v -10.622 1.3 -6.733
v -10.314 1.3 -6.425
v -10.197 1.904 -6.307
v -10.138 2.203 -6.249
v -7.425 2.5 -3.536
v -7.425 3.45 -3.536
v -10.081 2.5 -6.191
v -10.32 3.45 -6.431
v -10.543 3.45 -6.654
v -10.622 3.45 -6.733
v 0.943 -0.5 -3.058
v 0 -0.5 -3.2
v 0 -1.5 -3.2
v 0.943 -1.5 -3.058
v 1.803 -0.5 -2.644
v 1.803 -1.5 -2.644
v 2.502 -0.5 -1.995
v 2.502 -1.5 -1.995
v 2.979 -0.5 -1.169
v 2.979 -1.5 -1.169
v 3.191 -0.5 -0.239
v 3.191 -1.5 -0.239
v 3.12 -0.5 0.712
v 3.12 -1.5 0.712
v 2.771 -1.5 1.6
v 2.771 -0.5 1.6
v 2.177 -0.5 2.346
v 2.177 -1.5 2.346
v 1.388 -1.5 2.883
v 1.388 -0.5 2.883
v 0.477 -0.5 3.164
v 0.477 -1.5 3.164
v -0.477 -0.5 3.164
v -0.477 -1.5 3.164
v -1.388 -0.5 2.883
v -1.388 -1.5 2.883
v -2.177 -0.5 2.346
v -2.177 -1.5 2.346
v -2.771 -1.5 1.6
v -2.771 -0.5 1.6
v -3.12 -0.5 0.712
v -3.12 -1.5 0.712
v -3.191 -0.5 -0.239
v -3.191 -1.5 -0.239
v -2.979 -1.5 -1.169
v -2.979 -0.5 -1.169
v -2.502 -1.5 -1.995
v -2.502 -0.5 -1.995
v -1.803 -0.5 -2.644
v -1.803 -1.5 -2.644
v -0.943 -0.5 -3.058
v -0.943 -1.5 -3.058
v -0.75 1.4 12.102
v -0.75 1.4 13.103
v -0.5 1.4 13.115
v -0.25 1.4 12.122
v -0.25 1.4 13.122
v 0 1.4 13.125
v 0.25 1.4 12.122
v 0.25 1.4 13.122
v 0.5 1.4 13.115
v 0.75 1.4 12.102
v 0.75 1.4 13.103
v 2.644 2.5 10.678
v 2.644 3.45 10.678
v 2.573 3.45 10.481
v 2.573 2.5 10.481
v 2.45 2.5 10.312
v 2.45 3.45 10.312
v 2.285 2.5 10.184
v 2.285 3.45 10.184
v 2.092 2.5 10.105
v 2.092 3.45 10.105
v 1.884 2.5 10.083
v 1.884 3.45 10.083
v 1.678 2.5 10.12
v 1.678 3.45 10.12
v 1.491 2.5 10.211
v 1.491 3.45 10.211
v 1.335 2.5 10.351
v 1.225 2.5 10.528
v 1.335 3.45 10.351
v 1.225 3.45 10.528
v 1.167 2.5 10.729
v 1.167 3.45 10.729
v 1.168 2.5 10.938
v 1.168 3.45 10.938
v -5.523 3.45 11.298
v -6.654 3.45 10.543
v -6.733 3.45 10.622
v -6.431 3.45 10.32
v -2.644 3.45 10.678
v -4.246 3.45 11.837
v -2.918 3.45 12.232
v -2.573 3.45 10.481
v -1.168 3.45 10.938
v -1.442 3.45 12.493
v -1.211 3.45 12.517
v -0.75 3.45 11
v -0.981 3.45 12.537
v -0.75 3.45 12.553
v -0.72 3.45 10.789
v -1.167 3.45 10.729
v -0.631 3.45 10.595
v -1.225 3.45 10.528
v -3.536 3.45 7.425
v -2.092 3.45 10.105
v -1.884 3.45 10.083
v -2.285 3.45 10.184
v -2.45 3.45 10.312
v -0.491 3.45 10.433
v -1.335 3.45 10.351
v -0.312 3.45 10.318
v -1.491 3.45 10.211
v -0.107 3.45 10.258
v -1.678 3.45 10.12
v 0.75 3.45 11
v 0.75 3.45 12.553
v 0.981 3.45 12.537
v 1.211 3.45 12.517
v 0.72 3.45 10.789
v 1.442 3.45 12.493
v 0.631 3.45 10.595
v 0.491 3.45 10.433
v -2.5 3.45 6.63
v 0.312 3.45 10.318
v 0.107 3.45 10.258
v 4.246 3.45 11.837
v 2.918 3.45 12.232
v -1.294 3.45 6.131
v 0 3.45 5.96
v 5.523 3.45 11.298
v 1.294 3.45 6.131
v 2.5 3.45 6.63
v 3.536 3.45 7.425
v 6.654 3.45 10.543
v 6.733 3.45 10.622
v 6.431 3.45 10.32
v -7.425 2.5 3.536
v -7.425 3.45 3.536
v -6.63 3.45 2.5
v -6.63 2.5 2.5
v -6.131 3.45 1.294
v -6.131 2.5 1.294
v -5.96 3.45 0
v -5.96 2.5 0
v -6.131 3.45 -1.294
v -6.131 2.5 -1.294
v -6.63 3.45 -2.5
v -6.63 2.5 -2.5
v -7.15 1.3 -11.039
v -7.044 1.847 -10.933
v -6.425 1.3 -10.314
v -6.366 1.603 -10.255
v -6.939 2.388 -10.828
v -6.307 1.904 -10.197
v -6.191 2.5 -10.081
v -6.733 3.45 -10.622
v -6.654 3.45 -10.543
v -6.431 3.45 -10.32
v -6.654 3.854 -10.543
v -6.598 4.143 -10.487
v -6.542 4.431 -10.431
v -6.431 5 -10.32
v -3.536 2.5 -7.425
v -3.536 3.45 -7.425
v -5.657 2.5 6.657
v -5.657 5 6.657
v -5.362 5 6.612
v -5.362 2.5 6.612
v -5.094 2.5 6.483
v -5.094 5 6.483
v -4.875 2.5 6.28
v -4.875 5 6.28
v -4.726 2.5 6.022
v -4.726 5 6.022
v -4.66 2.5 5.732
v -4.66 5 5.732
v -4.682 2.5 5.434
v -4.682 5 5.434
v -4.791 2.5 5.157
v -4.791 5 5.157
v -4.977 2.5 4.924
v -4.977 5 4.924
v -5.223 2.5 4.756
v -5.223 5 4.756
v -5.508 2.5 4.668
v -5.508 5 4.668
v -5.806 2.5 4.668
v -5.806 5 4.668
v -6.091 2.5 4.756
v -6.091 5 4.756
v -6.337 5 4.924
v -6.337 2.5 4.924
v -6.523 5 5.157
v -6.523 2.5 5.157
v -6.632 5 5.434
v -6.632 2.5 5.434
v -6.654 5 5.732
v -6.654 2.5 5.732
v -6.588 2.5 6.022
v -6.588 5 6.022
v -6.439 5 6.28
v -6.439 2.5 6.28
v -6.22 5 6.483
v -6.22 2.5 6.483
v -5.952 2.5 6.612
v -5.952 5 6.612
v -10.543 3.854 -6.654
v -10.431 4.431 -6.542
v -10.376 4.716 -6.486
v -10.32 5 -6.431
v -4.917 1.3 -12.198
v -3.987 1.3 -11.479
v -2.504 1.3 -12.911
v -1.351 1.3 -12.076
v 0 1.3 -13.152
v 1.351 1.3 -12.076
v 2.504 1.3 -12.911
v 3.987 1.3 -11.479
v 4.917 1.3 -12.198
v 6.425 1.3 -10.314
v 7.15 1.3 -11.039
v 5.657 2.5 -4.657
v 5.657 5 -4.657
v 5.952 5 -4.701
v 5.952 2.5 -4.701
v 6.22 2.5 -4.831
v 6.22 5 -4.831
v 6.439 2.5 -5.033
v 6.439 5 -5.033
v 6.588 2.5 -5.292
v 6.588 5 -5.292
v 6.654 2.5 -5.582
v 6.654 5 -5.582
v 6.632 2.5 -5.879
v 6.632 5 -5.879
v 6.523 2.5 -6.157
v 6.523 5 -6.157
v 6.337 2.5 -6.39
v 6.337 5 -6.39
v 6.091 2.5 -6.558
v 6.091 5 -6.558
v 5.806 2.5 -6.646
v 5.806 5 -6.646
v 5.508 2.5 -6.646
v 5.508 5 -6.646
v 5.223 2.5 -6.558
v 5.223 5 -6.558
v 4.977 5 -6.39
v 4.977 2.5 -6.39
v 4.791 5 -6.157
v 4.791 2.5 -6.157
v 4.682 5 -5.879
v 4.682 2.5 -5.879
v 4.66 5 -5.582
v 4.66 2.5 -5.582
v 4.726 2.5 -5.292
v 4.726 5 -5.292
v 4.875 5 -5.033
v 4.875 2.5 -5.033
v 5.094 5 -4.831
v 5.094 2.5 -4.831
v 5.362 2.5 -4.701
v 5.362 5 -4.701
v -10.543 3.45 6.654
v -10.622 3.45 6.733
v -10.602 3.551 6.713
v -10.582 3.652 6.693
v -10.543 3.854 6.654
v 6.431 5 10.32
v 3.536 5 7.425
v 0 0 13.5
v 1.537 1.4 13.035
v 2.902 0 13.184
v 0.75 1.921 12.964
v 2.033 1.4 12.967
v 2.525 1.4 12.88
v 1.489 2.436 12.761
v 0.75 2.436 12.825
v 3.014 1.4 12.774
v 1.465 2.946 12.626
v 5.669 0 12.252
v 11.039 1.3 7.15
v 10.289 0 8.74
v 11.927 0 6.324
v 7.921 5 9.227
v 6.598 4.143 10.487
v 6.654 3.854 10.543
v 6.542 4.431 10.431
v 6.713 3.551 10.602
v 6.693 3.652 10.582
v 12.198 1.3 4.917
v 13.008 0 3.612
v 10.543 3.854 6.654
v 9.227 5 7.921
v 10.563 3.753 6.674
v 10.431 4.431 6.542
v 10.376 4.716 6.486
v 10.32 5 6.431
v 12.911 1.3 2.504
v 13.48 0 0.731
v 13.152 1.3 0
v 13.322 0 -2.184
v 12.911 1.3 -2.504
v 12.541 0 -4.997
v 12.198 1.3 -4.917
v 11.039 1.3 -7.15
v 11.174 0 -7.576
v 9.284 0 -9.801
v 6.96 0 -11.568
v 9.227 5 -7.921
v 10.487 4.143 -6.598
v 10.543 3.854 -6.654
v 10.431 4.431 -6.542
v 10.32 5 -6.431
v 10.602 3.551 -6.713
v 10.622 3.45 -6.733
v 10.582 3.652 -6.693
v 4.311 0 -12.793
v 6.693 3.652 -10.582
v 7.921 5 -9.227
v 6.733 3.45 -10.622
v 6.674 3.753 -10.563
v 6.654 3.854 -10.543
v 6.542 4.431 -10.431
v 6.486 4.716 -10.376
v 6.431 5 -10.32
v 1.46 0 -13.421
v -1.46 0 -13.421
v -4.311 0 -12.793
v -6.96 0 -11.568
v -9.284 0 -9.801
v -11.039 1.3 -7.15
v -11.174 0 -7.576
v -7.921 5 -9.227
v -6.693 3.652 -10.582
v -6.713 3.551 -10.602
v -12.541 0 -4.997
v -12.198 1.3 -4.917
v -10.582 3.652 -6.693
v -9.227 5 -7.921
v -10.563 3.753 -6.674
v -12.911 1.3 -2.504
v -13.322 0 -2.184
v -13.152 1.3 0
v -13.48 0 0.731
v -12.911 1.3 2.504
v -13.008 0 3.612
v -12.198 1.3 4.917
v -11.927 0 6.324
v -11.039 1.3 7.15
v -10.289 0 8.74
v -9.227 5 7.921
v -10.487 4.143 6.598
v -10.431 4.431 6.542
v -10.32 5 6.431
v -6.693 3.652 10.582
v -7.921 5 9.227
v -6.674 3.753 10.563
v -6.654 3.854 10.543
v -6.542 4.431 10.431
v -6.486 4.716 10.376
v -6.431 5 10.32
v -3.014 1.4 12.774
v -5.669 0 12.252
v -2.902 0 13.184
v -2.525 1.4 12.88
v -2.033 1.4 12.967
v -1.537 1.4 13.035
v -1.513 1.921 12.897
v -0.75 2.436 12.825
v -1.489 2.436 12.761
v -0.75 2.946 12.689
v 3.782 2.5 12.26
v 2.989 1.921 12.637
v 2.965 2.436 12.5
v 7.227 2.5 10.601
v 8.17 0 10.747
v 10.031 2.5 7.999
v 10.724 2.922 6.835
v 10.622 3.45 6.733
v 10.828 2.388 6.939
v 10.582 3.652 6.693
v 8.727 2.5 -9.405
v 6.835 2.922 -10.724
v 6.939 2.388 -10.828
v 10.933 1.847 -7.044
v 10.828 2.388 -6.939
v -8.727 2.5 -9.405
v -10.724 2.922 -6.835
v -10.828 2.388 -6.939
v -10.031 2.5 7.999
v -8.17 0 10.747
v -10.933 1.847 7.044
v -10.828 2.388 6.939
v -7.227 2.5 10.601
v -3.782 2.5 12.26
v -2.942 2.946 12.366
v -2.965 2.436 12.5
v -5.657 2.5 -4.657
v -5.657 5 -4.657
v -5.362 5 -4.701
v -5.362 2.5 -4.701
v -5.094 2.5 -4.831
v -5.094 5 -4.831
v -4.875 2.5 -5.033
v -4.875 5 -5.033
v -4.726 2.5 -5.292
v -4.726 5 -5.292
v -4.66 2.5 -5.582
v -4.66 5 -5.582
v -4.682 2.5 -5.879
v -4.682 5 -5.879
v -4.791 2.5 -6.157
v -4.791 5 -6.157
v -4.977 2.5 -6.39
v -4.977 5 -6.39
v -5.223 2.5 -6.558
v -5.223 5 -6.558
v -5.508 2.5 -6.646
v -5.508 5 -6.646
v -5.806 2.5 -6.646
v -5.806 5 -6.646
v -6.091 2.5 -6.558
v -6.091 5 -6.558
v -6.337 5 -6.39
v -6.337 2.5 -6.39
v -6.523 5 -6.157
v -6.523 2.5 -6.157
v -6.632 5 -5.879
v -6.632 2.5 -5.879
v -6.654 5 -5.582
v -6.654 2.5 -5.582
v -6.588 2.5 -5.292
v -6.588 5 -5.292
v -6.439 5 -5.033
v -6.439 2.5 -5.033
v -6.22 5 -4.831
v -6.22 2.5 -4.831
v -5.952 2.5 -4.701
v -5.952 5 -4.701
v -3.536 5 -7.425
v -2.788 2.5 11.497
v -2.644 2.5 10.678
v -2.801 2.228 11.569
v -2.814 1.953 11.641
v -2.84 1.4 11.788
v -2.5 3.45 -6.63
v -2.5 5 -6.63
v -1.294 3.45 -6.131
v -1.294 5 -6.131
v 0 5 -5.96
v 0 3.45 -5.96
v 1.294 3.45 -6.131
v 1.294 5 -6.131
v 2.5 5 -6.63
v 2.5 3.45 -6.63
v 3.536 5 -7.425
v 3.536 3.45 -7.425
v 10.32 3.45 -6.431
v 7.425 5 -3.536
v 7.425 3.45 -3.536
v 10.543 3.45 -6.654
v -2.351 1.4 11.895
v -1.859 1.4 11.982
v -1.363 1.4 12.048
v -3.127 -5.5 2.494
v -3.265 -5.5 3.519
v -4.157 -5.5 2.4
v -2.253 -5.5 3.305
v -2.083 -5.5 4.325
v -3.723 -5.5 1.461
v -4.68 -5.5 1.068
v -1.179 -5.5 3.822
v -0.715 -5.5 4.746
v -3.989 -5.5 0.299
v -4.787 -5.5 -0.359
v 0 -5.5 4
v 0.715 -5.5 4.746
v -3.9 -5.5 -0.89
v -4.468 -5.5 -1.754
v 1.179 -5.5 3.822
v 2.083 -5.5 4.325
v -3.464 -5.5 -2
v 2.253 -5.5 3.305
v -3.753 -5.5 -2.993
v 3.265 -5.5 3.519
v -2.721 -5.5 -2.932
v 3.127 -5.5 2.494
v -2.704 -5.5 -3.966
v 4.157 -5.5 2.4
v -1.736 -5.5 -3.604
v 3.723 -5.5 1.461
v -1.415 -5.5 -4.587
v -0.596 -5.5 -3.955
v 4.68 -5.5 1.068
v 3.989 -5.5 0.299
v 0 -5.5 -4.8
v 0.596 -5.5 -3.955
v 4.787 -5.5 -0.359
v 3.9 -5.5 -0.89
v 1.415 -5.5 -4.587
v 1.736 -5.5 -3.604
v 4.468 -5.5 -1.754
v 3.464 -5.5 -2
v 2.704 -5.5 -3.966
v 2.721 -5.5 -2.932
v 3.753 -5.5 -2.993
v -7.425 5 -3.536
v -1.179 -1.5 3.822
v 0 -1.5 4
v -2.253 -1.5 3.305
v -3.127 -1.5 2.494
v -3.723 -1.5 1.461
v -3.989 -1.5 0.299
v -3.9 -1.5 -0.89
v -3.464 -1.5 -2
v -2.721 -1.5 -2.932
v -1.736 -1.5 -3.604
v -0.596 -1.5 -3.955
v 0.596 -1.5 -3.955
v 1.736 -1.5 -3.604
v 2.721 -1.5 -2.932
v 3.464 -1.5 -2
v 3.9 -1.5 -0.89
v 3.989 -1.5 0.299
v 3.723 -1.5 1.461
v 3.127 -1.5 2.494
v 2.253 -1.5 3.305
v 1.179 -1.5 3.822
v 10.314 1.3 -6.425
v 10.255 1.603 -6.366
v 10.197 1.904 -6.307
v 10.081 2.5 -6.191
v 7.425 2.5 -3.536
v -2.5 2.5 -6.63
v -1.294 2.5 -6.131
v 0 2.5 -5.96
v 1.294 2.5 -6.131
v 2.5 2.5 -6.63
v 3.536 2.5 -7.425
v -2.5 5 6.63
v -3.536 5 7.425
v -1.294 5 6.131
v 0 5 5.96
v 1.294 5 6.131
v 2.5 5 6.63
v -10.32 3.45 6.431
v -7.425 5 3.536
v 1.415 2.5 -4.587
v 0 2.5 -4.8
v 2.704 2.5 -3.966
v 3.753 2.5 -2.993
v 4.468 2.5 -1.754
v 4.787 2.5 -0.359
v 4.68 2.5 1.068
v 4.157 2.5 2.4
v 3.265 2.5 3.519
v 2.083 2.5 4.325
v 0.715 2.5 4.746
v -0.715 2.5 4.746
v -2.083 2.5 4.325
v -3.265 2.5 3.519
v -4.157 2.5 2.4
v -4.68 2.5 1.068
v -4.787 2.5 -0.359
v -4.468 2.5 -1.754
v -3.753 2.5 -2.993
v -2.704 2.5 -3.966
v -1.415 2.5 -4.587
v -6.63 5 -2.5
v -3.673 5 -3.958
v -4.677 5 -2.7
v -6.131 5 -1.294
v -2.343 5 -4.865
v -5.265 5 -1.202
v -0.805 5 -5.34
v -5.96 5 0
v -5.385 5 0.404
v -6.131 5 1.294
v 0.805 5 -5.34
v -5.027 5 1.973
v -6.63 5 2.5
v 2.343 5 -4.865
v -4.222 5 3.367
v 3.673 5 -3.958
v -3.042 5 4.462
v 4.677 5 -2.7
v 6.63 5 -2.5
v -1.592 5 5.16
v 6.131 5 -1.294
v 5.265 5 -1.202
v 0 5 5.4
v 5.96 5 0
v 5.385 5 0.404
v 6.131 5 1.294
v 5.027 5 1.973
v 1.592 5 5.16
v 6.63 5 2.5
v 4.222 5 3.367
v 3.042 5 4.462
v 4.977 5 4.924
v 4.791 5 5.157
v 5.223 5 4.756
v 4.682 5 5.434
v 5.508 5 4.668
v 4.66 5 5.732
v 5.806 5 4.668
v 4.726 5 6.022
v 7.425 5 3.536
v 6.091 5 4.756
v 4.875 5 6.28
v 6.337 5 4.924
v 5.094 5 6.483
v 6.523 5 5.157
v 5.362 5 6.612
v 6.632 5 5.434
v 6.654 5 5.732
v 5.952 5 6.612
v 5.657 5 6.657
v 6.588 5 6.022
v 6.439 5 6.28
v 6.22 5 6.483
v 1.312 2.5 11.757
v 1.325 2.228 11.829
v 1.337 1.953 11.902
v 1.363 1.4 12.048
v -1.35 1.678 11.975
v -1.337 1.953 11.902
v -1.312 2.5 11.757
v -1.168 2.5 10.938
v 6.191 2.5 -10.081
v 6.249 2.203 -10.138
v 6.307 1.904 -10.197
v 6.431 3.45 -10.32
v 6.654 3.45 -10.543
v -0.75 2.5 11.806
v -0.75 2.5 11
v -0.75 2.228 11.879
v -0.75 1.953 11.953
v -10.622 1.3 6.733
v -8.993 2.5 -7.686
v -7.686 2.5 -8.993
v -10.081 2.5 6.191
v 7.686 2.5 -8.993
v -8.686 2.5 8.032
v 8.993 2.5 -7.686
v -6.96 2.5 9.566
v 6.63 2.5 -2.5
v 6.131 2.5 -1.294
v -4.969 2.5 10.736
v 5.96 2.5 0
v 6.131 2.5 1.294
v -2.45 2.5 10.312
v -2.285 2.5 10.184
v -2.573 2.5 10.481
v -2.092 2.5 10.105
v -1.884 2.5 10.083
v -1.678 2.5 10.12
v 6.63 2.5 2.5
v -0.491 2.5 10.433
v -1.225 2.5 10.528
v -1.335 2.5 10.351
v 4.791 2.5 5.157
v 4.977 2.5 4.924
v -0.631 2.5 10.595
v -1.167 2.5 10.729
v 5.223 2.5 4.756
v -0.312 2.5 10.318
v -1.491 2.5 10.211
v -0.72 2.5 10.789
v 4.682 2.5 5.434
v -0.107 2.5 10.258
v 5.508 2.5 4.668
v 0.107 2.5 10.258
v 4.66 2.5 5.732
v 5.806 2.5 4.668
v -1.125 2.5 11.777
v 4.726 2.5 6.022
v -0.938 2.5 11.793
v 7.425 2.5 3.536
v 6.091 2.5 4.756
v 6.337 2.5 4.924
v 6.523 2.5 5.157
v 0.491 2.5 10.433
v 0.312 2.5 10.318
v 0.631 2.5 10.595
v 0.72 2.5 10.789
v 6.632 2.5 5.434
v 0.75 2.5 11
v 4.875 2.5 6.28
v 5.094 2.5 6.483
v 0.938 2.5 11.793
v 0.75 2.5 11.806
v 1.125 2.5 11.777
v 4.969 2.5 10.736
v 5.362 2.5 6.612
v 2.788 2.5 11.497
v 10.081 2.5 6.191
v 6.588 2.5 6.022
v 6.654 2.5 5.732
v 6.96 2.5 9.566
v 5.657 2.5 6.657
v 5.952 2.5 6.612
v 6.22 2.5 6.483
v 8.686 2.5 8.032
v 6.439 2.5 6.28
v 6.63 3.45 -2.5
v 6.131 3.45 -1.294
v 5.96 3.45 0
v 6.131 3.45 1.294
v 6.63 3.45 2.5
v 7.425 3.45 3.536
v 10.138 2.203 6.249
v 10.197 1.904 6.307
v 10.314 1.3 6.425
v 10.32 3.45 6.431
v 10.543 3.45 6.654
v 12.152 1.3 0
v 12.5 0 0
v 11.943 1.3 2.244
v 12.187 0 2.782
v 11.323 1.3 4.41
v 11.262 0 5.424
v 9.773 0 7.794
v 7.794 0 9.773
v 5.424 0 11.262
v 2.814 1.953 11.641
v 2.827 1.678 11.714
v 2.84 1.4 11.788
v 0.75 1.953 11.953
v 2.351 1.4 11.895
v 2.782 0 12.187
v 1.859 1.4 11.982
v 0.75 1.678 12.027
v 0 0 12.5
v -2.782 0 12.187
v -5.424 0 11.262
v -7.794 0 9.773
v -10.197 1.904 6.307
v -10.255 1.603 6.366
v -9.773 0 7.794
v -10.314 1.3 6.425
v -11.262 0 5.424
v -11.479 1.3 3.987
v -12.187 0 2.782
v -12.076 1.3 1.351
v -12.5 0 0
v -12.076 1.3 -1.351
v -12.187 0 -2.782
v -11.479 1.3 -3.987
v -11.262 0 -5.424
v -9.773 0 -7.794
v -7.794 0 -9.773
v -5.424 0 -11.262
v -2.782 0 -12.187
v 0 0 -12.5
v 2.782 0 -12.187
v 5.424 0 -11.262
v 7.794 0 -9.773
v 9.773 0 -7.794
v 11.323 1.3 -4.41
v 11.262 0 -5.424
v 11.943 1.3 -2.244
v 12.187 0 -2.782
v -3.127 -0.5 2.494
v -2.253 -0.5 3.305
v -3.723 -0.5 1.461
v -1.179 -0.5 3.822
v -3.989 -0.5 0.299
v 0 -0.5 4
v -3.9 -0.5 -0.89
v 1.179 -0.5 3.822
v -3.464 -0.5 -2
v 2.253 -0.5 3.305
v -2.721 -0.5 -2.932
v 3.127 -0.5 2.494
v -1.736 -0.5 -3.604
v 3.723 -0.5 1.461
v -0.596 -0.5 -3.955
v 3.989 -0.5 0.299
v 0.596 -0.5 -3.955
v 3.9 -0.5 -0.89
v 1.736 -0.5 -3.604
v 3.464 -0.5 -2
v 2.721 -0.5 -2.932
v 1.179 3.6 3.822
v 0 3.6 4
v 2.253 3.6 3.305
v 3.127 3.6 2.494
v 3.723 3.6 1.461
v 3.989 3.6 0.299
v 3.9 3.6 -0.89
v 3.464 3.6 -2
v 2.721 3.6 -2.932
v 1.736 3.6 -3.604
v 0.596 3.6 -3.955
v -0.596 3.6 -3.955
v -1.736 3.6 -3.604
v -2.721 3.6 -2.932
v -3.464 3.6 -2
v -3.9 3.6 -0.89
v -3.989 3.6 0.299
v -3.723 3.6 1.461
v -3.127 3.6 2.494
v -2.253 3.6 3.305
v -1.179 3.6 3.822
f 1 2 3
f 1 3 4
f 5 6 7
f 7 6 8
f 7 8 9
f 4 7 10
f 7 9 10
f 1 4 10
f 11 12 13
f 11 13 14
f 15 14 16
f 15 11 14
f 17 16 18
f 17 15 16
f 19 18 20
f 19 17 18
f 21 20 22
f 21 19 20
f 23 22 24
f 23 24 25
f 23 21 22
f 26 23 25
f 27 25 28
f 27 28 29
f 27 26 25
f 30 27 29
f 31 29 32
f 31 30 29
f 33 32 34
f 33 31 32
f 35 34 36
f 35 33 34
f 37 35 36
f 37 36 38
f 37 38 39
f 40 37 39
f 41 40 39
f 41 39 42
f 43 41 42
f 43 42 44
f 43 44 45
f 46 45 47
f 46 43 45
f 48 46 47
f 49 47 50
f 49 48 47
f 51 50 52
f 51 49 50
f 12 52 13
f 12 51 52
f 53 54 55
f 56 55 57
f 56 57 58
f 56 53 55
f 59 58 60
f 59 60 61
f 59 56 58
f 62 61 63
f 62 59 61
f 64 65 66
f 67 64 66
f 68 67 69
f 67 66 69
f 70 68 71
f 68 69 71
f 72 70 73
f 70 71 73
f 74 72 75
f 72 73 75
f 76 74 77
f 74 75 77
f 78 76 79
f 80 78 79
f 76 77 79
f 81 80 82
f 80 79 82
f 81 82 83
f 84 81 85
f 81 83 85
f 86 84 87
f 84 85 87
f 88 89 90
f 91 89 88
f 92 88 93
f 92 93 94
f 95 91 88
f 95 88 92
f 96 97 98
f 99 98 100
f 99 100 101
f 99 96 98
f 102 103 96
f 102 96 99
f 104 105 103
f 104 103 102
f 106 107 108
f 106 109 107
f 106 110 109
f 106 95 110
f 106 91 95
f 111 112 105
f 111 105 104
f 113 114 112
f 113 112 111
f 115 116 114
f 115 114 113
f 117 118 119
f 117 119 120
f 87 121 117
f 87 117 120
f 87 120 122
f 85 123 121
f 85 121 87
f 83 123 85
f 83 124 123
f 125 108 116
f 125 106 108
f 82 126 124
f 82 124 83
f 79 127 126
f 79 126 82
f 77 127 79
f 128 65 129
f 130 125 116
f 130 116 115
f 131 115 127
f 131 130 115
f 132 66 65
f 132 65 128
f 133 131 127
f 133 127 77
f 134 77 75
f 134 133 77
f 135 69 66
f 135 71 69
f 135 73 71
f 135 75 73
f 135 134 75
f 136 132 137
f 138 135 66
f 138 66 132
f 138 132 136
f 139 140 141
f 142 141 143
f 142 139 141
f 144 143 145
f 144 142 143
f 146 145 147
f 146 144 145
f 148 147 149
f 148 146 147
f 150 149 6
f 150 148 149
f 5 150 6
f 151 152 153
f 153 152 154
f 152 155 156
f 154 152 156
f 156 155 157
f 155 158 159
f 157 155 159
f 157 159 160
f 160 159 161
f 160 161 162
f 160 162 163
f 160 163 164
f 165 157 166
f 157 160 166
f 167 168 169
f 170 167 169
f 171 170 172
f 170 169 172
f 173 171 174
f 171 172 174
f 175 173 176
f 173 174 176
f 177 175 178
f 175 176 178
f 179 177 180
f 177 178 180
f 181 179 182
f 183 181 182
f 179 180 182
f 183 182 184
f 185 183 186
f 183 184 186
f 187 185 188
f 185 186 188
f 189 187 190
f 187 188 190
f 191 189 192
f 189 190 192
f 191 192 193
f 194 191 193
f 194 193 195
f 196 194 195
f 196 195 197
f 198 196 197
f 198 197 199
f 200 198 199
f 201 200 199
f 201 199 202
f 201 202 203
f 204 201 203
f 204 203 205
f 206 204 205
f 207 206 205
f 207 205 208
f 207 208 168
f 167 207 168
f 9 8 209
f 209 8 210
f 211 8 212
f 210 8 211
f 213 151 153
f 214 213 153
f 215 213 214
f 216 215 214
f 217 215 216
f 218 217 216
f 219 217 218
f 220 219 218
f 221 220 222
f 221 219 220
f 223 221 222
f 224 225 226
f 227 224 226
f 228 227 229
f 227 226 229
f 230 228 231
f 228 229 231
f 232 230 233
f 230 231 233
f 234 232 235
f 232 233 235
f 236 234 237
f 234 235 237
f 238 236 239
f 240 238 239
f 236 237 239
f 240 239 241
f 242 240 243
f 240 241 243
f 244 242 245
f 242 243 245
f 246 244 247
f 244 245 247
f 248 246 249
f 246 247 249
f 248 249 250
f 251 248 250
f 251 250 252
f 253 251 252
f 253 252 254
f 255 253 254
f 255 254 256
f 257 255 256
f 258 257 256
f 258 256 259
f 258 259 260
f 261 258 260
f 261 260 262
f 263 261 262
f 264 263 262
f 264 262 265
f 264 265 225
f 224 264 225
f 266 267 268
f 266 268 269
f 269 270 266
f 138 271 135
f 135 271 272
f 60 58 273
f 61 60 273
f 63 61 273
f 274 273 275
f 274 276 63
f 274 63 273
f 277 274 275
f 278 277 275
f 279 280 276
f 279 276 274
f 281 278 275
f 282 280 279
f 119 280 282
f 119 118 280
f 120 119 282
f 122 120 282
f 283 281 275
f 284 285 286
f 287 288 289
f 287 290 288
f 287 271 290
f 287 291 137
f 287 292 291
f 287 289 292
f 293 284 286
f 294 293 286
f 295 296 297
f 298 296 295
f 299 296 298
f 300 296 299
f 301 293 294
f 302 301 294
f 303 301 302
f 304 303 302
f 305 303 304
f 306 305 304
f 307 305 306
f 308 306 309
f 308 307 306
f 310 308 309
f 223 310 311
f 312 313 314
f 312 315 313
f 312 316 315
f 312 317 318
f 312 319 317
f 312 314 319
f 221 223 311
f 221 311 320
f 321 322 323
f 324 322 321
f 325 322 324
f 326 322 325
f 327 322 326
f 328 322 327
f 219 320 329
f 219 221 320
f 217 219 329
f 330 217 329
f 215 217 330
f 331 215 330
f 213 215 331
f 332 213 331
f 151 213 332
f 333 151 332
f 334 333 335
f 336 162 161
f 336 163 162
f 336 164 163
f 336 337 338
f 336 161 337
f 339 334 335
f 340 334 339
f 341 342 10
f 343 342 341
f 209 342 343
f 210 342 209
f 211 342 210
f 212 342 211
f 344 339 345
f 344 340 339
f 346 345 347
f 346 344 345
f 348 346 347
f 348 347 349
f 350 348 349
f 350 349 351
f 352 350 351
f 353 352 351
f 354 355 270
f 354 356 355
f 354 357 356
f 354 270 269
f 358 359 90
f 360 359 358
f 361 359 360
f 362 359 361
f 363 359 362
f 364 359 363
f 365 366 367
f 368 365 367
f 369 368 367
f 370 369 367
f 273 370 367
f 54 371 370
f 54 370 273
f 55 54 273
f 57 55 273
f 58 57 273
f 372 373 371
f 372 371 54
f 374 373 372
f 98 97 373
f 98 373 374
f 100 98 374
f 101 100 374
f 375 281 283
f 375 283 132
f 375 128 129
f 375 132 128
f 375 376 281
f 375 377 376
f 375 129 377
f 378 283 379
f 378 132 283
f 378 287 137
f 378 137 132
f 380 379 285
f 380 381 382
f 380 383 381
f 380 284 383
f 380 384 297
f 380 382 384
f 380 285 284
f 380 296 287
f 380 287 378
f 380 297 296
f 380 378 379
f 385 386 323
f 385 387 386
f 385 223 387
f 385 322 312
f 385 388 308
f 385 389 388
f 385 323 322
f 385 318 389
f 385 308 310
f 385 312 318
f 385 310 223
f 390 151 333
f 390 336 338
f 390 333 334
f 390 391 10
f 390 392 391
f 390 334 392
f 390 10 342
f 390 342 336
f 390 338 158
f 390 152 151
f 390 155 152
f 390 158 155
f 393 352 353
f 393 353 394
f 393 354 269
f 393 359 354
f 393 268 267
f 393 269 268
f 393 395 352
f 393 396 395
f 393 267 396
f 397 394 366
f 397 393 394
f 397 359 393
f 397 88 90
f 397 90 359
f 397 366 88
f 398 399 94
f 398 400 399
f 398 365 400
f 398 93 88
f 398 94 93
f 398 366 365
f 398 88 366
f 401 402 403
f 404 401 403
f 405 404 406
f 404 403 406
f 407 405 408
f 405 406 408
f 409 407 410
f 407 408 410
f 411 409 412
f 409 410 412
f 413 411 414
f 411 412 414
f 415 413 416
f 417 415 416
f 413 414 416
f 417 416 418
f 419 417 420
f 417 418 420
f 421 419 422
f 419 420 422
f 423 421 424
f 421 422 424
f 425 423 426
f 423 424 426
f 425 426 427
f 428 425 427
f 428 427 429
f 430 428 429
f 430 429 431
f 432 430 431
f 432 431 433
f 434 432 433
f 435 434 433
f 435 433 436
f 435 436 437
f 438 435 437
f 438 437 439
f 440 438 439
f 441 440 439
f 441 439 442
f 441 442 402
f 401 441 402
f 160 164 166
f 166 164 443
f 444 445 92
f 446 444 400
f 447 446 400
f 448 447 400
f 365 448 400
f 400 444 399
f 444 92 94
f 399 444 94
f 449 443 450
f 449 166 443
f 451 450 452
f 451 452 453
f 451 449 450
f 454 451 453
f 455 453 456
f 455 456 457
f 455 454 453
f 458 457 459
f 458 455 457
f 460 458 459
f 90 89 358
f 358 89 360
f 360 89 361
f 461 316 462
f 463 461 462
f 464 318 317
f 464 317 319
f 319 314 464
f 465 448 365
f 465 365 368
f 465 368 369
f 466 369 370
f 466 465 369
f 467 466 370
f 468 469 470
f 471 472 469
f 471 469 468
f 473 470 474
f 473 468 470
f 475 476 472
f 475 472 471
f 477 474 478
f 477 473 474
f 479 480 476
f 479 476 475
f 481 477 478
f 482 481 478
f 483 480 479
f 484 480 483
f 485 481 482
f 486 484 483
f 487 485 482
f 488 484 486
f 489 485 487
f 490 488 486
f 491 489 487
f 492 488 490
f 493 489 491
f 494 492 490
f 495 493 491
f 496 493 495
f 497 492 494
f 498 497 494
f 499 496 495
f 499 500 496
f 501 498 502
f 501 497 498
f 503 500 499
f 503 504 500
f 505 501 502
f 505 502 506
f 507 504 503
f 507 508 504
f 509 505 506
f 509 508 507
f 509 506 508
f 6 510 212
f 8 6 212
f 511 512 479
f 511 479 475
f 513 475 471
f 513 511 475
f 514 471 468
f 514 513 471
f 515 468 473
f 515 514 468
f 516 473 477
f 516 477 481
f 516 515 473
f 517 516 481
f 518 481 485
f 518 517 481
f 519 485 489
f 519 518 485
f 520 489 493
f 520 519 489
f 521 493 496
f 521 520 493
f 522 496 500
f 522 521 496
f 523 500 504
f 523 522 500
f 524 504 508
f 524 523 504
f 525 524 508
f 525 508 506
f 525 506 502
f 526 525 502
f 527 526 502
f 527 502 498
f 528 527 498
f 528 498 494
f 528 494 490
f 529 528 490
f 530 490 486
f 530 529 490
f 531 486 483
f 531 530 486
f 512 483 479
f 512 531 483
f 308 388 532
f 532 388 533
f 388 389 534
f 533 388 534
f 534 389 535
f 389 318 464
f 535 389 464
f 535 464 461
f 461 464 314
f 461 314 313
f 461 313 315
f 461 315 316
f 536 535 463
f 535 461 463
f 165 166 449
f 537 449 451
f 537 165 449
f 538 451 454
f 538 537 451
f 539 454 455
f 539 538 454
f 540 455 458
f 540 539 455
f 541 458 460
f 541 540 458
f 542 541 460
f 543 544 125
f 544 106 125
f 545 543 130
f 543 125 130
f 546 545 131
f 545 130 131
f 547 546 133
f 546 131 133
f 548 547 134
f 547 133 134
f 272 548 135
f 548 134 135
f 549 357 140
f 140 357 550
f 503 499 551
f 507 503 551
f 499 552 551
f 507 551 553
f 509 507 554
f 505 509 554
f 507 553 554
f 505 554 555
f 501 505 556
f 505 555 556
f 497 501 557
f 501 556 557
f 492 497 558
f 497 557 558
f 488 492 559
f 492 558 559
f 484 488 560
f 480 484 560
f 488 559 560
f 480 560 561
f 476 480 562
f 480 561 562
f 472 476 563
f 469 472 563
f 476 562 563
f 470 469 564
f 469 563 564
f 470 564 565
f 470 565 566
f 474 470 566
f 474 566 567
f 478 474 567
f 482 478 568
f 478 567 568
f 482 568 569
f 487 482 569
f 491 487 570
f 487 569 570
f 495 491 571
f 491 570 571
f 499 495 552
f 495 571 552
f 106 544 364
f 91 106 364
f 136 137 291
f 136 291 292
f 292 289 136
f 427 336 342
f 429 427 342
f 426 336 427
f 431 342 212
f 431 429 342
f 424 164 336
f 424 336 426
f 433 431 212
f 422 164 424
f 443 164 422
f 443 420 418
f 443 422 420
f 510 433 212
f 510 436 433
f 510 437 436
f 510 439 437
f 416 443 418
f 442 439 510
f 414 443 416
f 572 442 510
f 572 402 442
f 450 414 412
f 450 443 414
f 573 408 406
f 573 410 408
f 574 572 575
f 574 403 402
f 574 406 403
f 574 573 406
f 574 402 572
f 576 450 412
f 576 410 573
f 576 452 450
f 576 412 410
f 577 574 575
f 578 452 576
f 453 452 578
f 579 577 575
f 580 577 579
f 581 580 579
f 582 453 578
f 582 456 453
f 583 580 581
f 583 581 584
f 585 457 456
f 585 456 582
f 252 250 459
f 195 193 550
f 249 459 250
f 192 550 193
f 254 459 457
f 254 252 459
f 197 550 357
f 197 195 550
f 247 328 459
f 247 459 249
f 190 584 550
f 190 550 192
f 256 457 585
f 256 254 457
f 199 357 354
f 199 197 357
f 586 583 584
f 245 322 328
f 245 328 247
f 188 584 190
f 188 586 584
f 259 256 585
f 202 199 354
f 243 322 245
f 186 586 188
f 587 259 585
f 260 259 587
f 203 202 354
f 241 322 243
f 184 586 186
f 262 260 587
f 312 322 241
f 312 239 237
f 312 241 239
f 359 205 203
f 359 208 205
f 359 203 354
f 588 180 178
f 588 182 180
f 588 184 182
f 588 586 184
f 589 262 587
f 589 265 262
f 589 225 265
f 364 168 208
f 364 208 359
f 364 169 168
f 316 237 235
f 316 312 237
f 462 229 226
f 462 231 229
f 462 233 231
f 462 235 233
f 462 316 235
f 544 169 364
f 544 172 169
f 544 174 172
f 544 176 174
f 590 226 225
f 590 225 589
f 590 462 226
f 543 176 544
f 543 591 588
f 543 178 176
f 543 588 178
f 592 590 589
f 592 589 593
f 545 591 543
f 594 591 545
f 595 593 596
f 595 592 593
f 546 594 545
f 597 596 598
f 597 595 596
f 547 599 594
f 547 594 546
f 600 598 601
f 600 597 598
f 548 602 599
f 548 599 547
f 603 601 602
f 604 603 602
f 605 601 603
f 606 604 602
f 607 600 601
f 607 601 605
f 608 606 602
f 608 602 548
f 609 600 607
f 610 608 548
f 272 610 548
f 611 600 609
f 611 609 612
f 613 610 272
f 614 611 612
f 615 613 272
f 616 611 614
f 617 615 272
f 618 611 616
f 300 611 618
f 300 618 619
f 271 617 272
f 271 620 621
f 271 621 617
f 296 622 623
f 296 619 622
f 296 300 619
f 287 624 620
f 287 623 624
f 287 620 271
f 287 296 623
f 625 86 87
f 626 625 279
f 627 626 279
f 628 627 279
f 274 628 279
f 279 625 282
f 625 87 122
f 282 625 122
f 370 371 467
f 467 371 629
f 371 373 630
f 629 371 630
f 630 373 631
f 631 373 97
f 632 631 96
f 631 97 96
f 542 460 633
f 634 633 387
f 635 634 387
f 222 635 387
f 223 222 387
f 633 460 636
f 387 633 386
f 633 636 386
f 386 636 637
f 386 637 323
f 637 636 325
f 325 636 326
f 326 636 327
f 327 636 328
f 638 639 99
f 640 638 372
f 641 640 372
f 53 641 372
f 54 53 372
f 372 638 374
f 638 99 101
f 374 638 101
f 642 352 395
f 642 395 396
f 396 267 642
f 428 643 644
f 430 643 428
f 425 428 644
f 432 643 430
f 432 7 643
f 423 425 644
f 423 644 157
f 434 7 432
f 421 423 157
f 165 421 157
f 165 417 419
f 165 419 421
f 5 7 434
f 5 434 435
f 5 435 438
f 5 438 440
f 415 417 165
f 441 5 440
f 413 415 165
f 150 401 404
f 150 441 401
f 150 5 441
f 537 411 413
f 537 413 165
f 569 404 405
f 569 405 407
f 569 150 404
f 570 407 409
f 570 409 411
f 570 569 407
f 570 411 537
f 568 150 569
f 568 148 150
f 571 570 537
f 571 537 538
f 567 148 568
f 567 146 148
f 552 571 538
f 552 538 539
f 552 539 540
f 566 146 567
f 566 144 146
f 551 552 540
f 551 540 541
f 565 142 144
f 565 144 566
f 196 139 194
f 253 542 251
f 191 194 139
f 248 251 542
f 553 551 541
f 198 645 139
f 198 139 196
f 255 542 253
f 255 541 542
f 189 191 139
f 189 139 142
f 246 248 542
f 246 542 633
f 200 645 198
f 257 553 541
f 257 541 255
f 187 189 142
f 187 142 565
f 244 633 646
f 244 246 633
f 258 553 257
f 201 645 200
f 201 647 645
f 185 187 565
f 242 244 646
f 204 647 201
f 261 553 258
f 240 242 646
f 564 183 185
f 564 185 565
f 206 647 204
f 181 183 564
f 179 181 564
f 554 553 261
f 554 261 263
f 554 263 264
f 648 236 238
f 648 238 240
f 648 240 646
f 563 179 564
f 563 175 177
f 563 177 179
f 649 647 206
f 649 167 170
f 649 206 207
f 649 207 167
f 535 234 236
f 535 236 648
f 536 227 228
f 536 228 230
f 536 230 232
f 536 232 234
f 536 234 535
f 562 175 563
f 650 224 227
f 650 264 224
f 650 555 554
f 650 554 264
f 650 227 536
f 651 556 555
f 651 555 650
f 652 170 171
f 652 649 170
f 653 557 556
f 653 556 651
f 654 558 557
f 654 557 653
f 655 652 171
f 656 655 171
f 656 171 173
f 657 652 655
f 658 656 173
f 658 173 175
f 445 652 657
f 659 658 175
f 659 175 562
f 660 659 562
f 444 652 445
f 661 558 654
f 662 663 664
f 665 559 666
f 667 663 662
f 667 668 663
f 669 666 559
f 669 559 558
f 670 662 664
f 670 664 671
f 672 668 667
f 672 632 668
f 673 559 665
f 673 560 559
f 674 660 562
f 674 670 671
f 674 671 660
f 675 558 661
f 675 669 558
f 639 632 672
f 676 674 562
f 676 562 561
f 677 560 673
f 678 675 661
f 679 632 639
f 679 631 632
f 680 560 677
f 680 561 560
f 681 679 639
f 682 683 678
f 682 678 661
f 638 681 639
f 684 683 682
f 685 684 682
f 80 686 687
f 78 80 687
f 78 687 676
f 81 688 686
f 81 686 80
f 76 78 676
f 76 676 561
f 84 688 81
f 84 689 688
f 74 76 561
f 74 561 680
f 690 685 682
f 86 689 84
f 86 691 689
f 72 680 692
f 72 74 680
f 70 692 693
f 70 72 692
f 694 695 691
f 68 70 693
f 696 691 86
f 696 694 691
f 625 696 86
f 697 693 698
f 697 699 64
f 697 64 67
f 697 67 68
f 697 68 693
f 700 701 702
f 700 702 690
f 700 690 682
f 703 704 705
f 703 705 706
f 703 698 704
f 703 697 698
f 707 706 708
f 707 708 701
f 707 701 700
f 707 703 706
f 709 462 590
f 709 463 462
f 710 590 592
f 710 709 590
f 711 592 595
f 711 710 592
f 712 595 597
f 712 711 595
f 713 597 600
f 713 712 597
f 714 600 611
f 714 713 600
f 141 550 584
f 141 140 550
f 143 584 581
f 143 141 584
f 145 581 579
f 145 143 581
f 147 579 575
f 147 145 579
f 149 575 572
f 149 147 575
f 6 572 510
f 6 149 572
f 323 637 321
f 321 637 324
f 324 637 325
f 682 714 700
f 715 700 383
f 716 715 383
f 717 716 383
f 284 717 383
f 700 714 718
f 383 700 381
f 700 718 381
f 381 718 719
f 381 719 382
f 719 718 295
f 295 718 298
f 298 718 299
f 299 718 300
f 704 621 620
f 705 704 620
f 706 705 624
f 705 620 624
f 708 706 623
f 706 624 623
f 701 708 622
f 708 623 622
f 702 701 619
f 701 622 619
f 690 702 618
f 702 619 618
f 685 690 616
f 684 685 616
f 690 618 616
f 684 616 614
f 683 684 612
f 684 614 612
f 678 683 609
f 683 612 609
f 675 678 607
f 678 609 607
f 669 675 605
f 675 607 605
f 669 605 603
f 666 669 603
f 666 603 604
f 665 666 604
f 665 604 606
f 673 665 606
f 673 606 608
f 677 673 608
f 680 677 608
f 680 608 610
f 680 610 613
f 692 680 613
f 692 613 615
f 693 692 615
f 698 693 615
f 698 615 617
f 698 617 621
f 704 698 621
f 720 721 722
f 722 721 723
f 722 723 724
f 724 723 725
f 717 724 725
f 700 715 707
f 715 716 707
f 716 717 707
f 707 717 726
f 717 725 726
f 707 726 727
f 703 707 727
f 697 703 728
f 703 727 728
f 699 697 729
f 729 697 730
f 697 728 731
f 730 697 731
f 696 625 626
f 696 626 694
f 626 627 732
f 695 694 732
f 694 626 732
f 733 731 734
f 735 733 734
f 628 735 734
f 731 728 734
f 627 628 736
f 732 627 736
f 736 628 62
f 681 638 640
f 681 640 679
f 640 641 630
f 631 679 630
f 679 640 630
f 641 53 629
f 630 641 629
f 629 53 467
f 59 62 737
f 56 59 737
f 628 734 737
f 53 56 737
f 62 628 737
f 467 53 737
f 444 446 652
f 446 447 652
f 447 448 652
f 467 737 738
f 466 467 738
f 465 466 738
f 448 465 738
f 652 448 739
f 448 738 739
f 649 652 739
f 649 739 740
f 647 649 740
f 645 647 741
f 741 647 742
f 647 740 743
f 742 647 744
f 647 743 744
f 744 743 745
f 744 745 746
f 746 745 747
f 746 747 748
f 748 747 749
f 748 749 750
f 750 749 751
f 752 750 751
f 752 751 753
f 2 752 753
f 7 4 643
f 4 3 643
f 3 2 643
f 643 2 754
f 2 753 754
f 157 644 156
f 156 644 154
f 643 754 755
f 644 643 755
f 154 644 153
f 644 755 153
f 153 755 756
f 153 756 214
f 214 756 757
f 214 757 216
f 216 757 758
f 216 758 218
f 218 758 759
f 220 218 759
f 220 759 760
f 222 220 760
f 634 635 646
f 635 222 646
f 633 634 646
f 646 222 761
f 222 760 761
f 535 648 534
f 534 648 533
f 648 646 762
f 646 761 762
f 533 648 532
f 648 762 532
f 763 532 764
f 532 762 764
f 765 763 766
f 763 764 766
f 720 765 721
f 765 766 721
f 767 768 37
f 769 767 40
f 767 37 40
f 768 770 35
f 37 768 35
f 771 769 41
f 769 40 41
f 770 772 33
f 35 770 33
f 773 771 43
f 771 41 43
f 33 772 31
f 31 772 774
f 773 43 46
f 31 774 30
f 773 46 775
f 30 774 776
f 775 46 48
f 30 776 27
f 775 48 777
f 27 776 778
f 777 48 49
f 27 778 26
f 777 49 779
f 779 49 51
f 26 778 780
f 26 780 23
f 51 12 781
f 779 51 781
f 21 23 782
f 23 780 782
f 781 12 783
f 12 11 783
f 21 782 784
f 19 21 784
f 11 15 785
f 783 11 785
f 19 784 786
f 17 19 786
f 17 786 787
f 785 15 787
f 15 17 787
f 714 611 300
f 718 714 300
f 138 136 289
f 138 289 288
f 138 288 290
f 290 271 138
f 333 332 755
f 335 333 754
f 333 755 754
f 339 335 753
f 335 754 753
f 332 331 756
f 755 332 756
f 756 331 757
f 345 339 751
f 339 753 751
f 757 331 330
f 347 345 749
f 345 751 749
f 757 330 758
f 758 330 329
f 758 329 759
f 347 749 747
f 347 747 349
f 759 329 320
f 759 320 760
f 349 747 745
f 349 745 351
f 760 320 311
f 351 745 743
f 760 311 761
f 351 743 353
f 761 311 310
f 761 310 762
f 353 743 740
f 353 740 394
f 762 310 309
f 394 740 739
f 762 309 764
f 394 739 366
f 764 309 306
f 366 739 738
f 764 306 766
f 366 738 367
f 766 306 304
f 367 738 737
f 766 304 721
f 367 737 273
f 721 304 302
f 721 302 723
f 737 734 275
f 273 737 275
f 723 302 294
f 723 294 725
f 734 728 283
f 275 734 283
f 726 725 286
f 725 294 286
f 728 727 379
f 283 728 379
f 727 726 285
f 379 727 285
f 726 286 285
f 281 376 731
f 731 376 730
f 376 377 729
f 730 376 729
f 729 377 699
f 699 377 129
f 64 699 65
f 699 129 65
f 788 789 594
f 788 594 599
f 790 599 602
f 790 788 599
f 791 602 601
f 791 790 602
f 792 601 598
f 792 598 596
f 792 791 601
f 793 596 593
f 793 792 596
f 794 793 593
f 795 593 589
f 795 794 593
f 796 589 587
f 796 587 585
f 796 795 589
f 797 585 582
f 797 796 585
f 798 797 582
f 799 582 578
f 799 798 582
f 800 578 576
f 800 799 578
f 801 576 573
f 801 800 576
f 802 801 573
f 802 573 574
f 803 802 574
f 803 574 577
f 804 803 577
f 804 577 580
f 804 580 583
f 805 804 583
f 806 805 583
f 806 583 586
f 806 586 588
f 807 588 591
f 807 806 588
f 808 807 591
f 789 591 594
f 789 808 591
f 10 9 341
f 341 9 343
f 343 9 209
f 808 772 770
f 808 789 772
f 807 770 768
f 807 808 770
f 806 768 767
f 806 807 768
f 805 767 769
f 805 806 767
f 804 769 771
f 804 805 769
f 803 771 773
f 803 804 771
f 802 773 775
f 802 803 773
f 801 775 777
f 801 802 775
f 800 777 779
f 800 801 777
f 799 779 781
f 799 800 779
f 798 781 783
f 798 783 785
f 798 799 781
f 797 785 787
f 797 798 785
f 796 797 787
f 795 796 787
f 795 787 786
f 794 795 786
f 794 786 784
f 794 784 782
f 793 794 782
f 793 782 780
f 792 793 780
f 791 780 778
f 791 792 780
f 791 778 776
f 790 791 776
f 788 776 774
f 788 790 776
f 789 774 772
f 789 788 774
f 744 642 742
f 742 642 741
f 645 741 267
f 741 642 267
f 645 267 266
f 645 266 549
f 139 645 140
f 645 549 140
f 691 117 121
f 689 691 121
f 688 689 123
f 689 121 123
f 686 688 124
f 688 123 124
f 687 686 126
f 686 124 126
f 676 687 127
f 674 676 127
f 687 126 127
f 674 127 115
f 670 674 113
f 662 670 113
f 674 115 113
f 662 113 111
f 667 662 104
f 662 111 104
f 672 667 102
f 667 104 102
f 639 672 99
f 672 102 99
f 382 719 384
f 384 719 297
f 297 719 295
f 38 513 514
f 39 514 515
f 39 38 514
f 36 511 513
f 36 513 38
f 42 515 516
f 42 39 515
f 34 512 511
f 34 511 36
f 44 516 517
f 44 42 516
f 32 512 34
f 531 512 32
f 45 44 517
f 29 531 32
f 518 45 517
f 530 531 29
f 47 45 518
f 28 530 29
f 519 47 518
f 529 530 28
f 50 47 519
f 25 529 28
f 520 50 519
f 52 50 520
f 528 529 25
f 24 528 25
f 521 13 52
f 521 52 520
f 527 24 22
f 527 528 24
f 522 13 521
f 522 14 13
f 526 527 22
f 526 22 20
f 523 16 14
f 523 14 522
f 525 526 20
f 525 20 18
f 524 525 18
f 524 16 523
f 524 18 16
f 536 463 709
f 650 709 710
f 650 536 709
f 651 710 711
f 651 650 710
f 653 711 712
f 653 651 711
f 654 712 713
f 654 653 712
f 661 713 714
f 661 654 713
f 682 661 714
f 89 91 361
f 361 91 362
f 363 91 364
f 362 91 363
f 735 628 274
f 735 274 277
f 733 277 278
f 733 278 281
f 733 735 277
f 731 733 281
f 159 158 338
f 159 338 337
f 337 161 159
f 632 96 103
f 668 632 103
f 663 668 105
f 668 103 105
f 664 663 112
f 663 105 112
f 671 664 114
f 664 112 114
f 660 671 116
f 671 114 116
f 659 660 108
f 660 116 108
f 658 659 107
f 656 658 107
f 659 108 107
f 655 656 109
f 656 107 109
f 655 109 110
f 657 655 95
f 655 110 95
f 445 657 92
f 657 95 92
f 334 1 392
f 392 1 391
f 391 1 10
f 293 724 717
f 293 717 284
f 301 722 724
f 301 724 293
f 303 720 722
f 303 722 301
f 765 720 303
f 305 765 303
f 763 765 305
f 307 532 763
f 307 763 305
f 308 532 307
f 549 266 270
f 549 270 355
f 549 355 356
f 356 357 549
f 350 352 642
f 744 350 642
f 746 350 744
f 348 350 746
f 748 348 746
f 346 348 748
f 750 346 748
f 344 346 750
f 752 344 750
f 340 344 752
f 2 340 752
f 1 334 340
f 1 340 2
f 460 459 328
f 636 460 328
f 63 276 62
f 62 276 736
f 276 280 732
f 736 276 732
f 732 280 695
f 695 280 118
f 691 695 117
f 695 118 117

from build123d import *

# Parameters (mm, degrees)
SKETCH1_R                   = 13.5
BASE_SIZE_DEPTH             = 5
MOUNTING_HOLES_REACH        = 21.736
SKETCH2_R                   = 1
SKETCH3_R                   = 12.5
ROTOR_POCKET_DEPTH          = 2.5
ROTOR_POCKET_DRAFT          = -15
OUTSIDE_CHAMFER_SIZE        = 5
OUTSIDE_CHAMFER_SIZE_2      = 1.339745962
BOTTOM_POCKETS_TOP_DEPTH    = 1.55
BOTTOM_POCKETS_BOTTOM_DEPTH = 2.15
BOTTOM_POCKETS_FILLET_R     = 5
CUT_EXTRUDE5_REACH          = 21.736
SKETCH6_R                   = 4
CHAMFER2_SIZE               = 1.4
SKETCH7_R                   = 4.8
SKETCH7_R_2                 = 4
BEARING_BOTTOM_DEPTH        = 3
SKETCH8_R                   = 4.8
SKETCH8_R_2                 = 3.2
BEARING_SEPARATOR_DEPTH     = 1
SKETCH9_R                   = 4.8
SKETCH9_R_2                 = 4
BEARING_TOP_DEPTH           = 4
CUT_EXTRUDE6_DEPTH          = 2.05


with BuildPart() as part:
    # Sketch1 → Base size (new body)
    with BuildSketch(Plane(origin=(0, 0, 0), x_dir=(1, 0, 0), z_dir=(0, 1, 0))):
        with Locations(Location((0, 0, 0), (0, 0, 270))):
            Circle(SKETCH1_R)
    extrude(amount=BASE_SIZE_DEPTH)

    # Sketch2 → Mounting holes (cut, up to next)
    with BuildSketch(Plane(origin=(0, 5, 0), x_dir=(1, 0, 0), z_dir=(0, 1, 0)), mode=Mode.PRIVATE) as mounting_holes_sk1:
        with Locations(Location((5.656854249, 5.656854249, 0), (0, 0, 270))):
            Circle(SKETCH2_R)
    mounting_holes_tool1 = extrude(mounting_holes_sk1.sketch, amount=-MOUNTING_HOLES_REACH, mode=Mode.PRIVATE) & part.part
    # Sketch2 → Mounting holes (cut, up to next)
    with BuildSketch(Plane(origin=(0, 5, 0), x_dir=(1, 0, 0), z_dir=(0, 1, 0)), mode=Mode.PRIVATE) as mounting_holes_sk2:
        with Locations(Location((-5.656854249, -5.656854249, 0), (0, 0, 270))):
            Circle(SKETCH2_R)
    mounting_holes_tool2 = extrude(mounting_holes_sk2.sketch, amount=-MOUNTING_HOLES_REACH, mode=Mode.PRIVATE) & part.part
    # Sketch2 → Mounting holes (cut, up to next)
    with BuildSketch(Plane(origin=(0, 5, 0), x_dir=(1, 0, 0), z_dir=(0, 1, 0)), mode=Mode.PRIVATE) as mounting_holes_sk3:
        with Locations(Location((5.656854249, -5.656854249, 0), (0, 0, 270))):
            Circle(SKETCH2_R)
    mounting_holes_tool3 = extrude(mounting_holes_sk3.sketch, amount=-MOUNTING_HOLES_REACH, mode=Mode.PRIVATE) & part.part
    # Sketch2 → Mounting holes (cut, up to next)
    with BuildSketch(Plane(origin=(0, 5, 0), x_dir=(1, 0, 0), z_dir=(0, 1, 0)), mode=Mode.PRIVATE) as mounting_holes_sk4:
        with Locations(Location((-5.656854249, 5.656854249, 0), (0, 0, 270))):
            Circle(SKETCH2_R)
    mounting_holes_tool4 = extrude(mounting_holes_sk4.sketch, amount=-MOUNTING_HOLES_REACH, mode=Mode.PRIVATE) & part.part
    add(mounting_holes_tool1.solids().sort_by_distance((5.656854, 5, -5.656854))[0], mode=Mode.SUBTRACT)
    add(mounting_holes_tool2.solids().sort_by_distance((-5.656854, 5, 5.656854))[0], mode=Mode.SUBTRACT)
    add(mounting_holes_tool3.solids().sort_by_distance((5.656854, 5, 5.656854))[0], mode=Mode.SUBTRACT)
    add(mounting_holes_tool4.solids().sort_by_distance((-5.656854, 5, -5.656854))[0], mode=Mode.SUBTRACT)


with BuildPart() as rotor_pocket_tool:
    # Sketch3 → Rotor pocket (with draft: the straight prism first)
    with BuildSketch(Plane.XZ):
        Circle(SKETCH3_R)
    extrude(amount=-ROTOR_POCKET_DEPTH)
    # Rotor pocket: the draft: its side faces are tilted about the plane it starts from
    rotor_pocket_sides = [rotor_pocket_tool.faces().sort_by_distance(p)[0] for p in [
        (-12.5, 1.25, 0),
    ]]
    draft(rotor_pocket_sides, Plane.XZ, ROTOR_POCKET_DRAFT)


with BuildPart() as part_1:
    add(part.part)

    # Rotor pocket: cut by rotor_pocket_tool
    add(rotor_pocket_tool.part, mode=Mode.SUBTRACT)

    # Outside chamfer
    # the kernel refuses this chamfer: 5, 1.339745962 mm, written as the material it takes off along each edge
    with BuildSketch(Plane(origin=(0, 5, 0), x_dir=(0, 0, 1), z_dir=(-1, 0, 0))) as outside_chamfer_piece_1:
        Polygon((13.5, -OUTSIDE_CHAMFER_SIZE), (13.5 - OUTSIDE_CHAMFER_SIZE_2, 0), (13.5, 0), align=None)
    revolve(axis=Axis((0, 5, 0), (0, 1, 0)), mode=Mode.SUBTRACT)

    # Sketch4 → Bottom pockets top (cut)
    with BuildSketch(Plane(origin=(0, 5, 0), x_dir=(1, 0, 0), z_dir=(0, 1, 0))):
        with BuildLine():
            Line((-3.889087297, 0), (-10.320380271, 6.431292975))
            ThreePointArc((-10.320380271, 6.431292975), (-12.160254038, 0), (-10.320380271, -6.431292975))
            Line((-10.320380271, -6.431292975), (-3.889087297, 0))
        make_face()
        with BuildLine():
            Line((-10.320380271, 6.431292975), (-10.543141739, 6.654054443))
            Line((-10.543141739, 6.654054443), (-11.29033147, 7.401244173))
            ThreePointArc((-11.29033147, 7.401244173), (-13.5, 0), (-11.29033147, -7.401244173))
            Line((-11.29033147, -7.401244173), (-10.543141739, -6.654054443))
            Line((-10.543141739, -6.654054443), (-10.320380271, -6.431292975))
            ThreePointArc((-10.320380271, -6.431292975), (-12.160254038, 0), (-10.320380271, 6.431292975))
        make_face()
        with BuildLine():
            ThreePointArc((6.431292975, 10.320380271), (0, 12.160254038), (-6.431292975, 10.320380271))
            Line((-6.431292975, 10.320380271), (0, 3.889087297))
            Line((0, 3.889087297), (6.431292975, 10.320380271))
        make_face()
        with BuildLine():
            Line((-6.654054443, 10.543141739), (-6.431292975, 10.320380271))
            ThreePointArc((-6.431292975, 10.320380271), (0, 12.160254038), (6.431292975, 10.320380271))
            Line((6.431292975, 10.320380271), (6.654054443, 10.543141739))
            Line((6.654054443, 10.543141739), (7.401244173, 11.29033147))
            ThreePointArc((7.401244173, 11.29033147), (0, 13.5), (-7.401244173, 11.29033147))
            Line((-7.401244173, 11.29033147), (-6.654054443, 10.543141739))
        make_face()
        with BuildLine():
            Line((10.320380271, 6.431292975), (3.889087297, 0))
            Line((3.889087297, 0), (10.320380271, -6.431292975))
            ThreePointArc((10.320380271, -6.431292975), (11.691240827, -3.344647396), (12.160254038, 0))
            ThreePointArc((12.160254038, 0), (11.691240827, 3.344647396), (10.320380271, 6.431292975))
        make_face()
        with BuildLine():
            Line((10.543141739, 6.654054443), (10.320380271, 6.431292975))
            ThreePointArc((10.320380271, 6.431292975), (11.691240827, 3.344647396), (12.160254038, 0))
            ThreePointArc((12.160254038, 0), (11.691240827, -3.344647396), (10.320380271, -6.431292975))
            Line((10.320380271, -6.431292975), (10.543141739, -6.654054443))
            Line((10.543141739, -6.654054443), (11.29033147, -7.401244173))
            ThreePointArc((11.29033147, -7.401244173), (12.935792879, -3.862028299), (13.5, 0))
            ThreePointArc((13.5, 0), (12.935792879, 3.862028299), (11.29033147, 7.401244173))
            Line((11.29033147, 7.401244173), (10.543141739, 6.654054443))
        make_face()
        with BuildLine():
            ThreePointArc((6.431292975, -10.320380271), (0, -12.160254038), (-6.431292975, -10.320380271))
            Line((-6.431292975, -10.320380271), (-6.654054443, -10.543141739))
            Line((-6.654054443, -10.543141739), (-7.401244173, -11.29033147))
            ThreePointArc((-7.401244173, -11.29033147), (0, -13.5), (7.401244173, -11.29033147))
            Line((7.401244173, -11.29033147), (6.654054443, -10.543141739))
            Line((6.654054443, -10.543141739), (6.431292975, -10.320380271))
        make_face()
        with BuildLine():
            Line((6.431292975, -10.320380271), (0, -3.889087297))
            Line((0, -3.889087297), (-6.431292975, -10.320380271))
            ThreePointArc((-6.431292975, -10.320380271), (0, -12.160254038), (6.431292975, -10.320380271))
        make_face()
    extrude(amount=-BOTTOM_POCKETS_TOP_DEPTH, mode=Mode.SUBTRACT)

    # Sketch5 → Bottom pockets bottom (cut)
    with BuildSketch(Plane(origin=(0, 3.45, 0), x_dir=(1, 0, 0), z_dir=(0, 1, 0))):
        with BuildLine():
            ThreePointArc((-10.621599421, 6.732512125), (-12.575575286, 0), (-10.621599421, -6.732512125))
            Line((-10.621599421, -6.732512125), (-3.889087297, 0))
            Line((-3.889087297, 0), (-10.621599421, 6.732512125))
        make_face()
        with BuildLine():
            Line((-10.621599421, 6.732512125), (-11.29033147, 7.401244173))
            ThreePointArc((-11.29033147, 7.401244173), (-13.5, 0), (-11.29033147, -7.401244173))
            Line((-11.29033147, -7.401244173), (-10.621599421, -6.732512125))
            ThreePointArc((-10.621599421, -6.732512125), (-12.575575286, 0), (-10.621599421, 6.732512125))
        make_face()
        with BuildLine():
            ThreePointArc((7.401244173, 11.29033147), (0, 13.5), (-7.401244173, 11.29033147))
            Line((-7.401244173, 11.29033147), (0, 3.889087297))
            Line((0, 3.889087297), (7.401244173, 11.29033147))
        make_face()
        with BuildLine():
            Line((11.29033147, 7.401244173), (3.889087297, 0))
            Line((3.889087297, 0), (11.29033147, -7.401244173))
            ThreePointArc((11.29033147, -7.401244173), (12.935792879, -3.862028299), (13.5, 0))
            ThreePointArc((13.5, 0), (12.935792879, 3.862028299), (11.29033147, 7.401244173))
        make_face()
    extrude(amount=-BOTTOM_POCKETS_BOTTOM_DEPTH, mode=Mode.SUBTRACT)

    # Bottom pockets fillet
    bottom_pockets_fillet_edges = [part_1.edges().sort_by_distance(p)[0] for p in [
        (-3.889087297, 3.75, 0),
        (3.889087297, 3.75, 0),
        (0, 4.225, 3.889087297),
        (0, 3.75, -3.889087297),
    ]]
    fillet(bottom_pockets_fillet_edges, radius=BOTTOM_POCKETS_FILLET_R)

    # Sketch6 → Cut-Extrude5 (cut, up to next)
    with BuildSketch(Plane(origin=(0, 5, 0), x_dir=(1, 0, 0), z_dir=(0, 1, 0)), mode=Mode.PRIVATE) as cut_extrude5_sk1:
        with Locations(Location((0, 0, 0), (0, 0, 270))):
            Circle(SKETCH6_R)
    cut_extrude5_tool1 = extrude(cut_extrude5_sk1.sketch, amount=-CUT_EXTRUDE5_REACH, mode=Mode.PRIVATE) & part_1.part
    add(cut_extrude5_tool1.solids().sort_by_distance((0, 5, 0))[0], mode=Mode.SUBTRACT)

    # Chamfer2
    chamfer2_edges = [part_1.edges().sort_by_distance(p)[0] for p in [
        (0, 5, -4),
    ]]
    chamfer(chamfer2_edges, length=CHAMFER2_SIZE)

    # Sketch7 → Bearing bottom (add)
    with BuildSketch(Plane.XZ.offset(-2.5)):
        with Locations(Location((0, 0, 0), (0, 0, 270))):
            Circle(SKETCH7_R)
        with Locations(Location((0, 0, 0), (0, 0, 90))):
            Circle(SKETCH7_R_2, mode=Mode.SUBTRACT)
    extrude(amount=BEARING_BOTTOM_DEPTH)

    # Sketch8 → Bearing separator (add)
    with BuildSketch(Plane.XZ.offset(0.5)):
        with Locations(Location((0, 0, 0), (0, 0, 270))):
            Circle(SKETCH8_R)
        with Locations(Location((0, 0, 0), (0, 0, 270))):
            Circle(SKETCH8_R_2, mode=Mode.SUBTRACT)
    extrude(amount=BEARING_SEPARATOR_DEPTH)

    # Sketch9 → Bearing top (add)
    with BuildSketch(Plane.XZ.offset(1.5)):
        with Locations(Location((0, 0, 0), (0, 0, 270))):
            Circle(SKETCH9_R)
        with Locations(Location((0, 0, 0), (0, 0, 90))):
            Circle(SKETCH9_R_2, mode=Mode.SUBTRACT)
    extrude(amount=BEARING_TOP_DEPTH)

    # Sketch10 → Cut-Extrude6 (cut)
    with BuildSketch(Plane(origin=(0, 3.45, 0), x_dir=(1, 0, 0), z_dir=(0, 1, 0))):
        with BuildLine():
            ThreePointArc((-1.167513596, -10.937865971), (-1.779893821, -10.094279468), (-2.643866576, -10.677545108))
            Line((-2.643866576, -10.677545108), (-3.078810633, -13.144235432))
            ThreePointArc((-3.078810633, -13.144235432), (-2.344250399, -13.294904666), (-1.602457654, -13.404556295))
            Line((-1.602457654, -13.404556295), (-1.167513596, -10.937865971))
        make_face()
        with BuildLine():
            ThreePointArc((2.643866576, -10.677545108), (1.779893821, -10.094279468), (1.167513596, -10.937865971))
            Line((1.167513596, -10.937865971), (1.602457654, -13.404556295))
            ThreePointArc((1.602457654, -13.404556295), (2.344250399, -13.294904666), (3.078810633, -13.144235432))
            Line((3.078810633, -13.144235432), (2.643866576, -10.677545108))
        make_face()
        with BuildLine():
            Line((-0.75, -11), (-0.75, -13.479150567))
            ThreePointArc((-0.75, -13.479150567), (0, -13.5), (0.75, -13.479150567))
            Line((0.75, -13.479150567), (0.75, -11))
            ThreePointArc((0.75, -11), (0, -10.25), (-0.75, -11))
        make_face()
    extrude(amount=-CUT_EXTRUDE6_DEPTH, mode=Mode.SUBTRACT)


solid = part_1.part
